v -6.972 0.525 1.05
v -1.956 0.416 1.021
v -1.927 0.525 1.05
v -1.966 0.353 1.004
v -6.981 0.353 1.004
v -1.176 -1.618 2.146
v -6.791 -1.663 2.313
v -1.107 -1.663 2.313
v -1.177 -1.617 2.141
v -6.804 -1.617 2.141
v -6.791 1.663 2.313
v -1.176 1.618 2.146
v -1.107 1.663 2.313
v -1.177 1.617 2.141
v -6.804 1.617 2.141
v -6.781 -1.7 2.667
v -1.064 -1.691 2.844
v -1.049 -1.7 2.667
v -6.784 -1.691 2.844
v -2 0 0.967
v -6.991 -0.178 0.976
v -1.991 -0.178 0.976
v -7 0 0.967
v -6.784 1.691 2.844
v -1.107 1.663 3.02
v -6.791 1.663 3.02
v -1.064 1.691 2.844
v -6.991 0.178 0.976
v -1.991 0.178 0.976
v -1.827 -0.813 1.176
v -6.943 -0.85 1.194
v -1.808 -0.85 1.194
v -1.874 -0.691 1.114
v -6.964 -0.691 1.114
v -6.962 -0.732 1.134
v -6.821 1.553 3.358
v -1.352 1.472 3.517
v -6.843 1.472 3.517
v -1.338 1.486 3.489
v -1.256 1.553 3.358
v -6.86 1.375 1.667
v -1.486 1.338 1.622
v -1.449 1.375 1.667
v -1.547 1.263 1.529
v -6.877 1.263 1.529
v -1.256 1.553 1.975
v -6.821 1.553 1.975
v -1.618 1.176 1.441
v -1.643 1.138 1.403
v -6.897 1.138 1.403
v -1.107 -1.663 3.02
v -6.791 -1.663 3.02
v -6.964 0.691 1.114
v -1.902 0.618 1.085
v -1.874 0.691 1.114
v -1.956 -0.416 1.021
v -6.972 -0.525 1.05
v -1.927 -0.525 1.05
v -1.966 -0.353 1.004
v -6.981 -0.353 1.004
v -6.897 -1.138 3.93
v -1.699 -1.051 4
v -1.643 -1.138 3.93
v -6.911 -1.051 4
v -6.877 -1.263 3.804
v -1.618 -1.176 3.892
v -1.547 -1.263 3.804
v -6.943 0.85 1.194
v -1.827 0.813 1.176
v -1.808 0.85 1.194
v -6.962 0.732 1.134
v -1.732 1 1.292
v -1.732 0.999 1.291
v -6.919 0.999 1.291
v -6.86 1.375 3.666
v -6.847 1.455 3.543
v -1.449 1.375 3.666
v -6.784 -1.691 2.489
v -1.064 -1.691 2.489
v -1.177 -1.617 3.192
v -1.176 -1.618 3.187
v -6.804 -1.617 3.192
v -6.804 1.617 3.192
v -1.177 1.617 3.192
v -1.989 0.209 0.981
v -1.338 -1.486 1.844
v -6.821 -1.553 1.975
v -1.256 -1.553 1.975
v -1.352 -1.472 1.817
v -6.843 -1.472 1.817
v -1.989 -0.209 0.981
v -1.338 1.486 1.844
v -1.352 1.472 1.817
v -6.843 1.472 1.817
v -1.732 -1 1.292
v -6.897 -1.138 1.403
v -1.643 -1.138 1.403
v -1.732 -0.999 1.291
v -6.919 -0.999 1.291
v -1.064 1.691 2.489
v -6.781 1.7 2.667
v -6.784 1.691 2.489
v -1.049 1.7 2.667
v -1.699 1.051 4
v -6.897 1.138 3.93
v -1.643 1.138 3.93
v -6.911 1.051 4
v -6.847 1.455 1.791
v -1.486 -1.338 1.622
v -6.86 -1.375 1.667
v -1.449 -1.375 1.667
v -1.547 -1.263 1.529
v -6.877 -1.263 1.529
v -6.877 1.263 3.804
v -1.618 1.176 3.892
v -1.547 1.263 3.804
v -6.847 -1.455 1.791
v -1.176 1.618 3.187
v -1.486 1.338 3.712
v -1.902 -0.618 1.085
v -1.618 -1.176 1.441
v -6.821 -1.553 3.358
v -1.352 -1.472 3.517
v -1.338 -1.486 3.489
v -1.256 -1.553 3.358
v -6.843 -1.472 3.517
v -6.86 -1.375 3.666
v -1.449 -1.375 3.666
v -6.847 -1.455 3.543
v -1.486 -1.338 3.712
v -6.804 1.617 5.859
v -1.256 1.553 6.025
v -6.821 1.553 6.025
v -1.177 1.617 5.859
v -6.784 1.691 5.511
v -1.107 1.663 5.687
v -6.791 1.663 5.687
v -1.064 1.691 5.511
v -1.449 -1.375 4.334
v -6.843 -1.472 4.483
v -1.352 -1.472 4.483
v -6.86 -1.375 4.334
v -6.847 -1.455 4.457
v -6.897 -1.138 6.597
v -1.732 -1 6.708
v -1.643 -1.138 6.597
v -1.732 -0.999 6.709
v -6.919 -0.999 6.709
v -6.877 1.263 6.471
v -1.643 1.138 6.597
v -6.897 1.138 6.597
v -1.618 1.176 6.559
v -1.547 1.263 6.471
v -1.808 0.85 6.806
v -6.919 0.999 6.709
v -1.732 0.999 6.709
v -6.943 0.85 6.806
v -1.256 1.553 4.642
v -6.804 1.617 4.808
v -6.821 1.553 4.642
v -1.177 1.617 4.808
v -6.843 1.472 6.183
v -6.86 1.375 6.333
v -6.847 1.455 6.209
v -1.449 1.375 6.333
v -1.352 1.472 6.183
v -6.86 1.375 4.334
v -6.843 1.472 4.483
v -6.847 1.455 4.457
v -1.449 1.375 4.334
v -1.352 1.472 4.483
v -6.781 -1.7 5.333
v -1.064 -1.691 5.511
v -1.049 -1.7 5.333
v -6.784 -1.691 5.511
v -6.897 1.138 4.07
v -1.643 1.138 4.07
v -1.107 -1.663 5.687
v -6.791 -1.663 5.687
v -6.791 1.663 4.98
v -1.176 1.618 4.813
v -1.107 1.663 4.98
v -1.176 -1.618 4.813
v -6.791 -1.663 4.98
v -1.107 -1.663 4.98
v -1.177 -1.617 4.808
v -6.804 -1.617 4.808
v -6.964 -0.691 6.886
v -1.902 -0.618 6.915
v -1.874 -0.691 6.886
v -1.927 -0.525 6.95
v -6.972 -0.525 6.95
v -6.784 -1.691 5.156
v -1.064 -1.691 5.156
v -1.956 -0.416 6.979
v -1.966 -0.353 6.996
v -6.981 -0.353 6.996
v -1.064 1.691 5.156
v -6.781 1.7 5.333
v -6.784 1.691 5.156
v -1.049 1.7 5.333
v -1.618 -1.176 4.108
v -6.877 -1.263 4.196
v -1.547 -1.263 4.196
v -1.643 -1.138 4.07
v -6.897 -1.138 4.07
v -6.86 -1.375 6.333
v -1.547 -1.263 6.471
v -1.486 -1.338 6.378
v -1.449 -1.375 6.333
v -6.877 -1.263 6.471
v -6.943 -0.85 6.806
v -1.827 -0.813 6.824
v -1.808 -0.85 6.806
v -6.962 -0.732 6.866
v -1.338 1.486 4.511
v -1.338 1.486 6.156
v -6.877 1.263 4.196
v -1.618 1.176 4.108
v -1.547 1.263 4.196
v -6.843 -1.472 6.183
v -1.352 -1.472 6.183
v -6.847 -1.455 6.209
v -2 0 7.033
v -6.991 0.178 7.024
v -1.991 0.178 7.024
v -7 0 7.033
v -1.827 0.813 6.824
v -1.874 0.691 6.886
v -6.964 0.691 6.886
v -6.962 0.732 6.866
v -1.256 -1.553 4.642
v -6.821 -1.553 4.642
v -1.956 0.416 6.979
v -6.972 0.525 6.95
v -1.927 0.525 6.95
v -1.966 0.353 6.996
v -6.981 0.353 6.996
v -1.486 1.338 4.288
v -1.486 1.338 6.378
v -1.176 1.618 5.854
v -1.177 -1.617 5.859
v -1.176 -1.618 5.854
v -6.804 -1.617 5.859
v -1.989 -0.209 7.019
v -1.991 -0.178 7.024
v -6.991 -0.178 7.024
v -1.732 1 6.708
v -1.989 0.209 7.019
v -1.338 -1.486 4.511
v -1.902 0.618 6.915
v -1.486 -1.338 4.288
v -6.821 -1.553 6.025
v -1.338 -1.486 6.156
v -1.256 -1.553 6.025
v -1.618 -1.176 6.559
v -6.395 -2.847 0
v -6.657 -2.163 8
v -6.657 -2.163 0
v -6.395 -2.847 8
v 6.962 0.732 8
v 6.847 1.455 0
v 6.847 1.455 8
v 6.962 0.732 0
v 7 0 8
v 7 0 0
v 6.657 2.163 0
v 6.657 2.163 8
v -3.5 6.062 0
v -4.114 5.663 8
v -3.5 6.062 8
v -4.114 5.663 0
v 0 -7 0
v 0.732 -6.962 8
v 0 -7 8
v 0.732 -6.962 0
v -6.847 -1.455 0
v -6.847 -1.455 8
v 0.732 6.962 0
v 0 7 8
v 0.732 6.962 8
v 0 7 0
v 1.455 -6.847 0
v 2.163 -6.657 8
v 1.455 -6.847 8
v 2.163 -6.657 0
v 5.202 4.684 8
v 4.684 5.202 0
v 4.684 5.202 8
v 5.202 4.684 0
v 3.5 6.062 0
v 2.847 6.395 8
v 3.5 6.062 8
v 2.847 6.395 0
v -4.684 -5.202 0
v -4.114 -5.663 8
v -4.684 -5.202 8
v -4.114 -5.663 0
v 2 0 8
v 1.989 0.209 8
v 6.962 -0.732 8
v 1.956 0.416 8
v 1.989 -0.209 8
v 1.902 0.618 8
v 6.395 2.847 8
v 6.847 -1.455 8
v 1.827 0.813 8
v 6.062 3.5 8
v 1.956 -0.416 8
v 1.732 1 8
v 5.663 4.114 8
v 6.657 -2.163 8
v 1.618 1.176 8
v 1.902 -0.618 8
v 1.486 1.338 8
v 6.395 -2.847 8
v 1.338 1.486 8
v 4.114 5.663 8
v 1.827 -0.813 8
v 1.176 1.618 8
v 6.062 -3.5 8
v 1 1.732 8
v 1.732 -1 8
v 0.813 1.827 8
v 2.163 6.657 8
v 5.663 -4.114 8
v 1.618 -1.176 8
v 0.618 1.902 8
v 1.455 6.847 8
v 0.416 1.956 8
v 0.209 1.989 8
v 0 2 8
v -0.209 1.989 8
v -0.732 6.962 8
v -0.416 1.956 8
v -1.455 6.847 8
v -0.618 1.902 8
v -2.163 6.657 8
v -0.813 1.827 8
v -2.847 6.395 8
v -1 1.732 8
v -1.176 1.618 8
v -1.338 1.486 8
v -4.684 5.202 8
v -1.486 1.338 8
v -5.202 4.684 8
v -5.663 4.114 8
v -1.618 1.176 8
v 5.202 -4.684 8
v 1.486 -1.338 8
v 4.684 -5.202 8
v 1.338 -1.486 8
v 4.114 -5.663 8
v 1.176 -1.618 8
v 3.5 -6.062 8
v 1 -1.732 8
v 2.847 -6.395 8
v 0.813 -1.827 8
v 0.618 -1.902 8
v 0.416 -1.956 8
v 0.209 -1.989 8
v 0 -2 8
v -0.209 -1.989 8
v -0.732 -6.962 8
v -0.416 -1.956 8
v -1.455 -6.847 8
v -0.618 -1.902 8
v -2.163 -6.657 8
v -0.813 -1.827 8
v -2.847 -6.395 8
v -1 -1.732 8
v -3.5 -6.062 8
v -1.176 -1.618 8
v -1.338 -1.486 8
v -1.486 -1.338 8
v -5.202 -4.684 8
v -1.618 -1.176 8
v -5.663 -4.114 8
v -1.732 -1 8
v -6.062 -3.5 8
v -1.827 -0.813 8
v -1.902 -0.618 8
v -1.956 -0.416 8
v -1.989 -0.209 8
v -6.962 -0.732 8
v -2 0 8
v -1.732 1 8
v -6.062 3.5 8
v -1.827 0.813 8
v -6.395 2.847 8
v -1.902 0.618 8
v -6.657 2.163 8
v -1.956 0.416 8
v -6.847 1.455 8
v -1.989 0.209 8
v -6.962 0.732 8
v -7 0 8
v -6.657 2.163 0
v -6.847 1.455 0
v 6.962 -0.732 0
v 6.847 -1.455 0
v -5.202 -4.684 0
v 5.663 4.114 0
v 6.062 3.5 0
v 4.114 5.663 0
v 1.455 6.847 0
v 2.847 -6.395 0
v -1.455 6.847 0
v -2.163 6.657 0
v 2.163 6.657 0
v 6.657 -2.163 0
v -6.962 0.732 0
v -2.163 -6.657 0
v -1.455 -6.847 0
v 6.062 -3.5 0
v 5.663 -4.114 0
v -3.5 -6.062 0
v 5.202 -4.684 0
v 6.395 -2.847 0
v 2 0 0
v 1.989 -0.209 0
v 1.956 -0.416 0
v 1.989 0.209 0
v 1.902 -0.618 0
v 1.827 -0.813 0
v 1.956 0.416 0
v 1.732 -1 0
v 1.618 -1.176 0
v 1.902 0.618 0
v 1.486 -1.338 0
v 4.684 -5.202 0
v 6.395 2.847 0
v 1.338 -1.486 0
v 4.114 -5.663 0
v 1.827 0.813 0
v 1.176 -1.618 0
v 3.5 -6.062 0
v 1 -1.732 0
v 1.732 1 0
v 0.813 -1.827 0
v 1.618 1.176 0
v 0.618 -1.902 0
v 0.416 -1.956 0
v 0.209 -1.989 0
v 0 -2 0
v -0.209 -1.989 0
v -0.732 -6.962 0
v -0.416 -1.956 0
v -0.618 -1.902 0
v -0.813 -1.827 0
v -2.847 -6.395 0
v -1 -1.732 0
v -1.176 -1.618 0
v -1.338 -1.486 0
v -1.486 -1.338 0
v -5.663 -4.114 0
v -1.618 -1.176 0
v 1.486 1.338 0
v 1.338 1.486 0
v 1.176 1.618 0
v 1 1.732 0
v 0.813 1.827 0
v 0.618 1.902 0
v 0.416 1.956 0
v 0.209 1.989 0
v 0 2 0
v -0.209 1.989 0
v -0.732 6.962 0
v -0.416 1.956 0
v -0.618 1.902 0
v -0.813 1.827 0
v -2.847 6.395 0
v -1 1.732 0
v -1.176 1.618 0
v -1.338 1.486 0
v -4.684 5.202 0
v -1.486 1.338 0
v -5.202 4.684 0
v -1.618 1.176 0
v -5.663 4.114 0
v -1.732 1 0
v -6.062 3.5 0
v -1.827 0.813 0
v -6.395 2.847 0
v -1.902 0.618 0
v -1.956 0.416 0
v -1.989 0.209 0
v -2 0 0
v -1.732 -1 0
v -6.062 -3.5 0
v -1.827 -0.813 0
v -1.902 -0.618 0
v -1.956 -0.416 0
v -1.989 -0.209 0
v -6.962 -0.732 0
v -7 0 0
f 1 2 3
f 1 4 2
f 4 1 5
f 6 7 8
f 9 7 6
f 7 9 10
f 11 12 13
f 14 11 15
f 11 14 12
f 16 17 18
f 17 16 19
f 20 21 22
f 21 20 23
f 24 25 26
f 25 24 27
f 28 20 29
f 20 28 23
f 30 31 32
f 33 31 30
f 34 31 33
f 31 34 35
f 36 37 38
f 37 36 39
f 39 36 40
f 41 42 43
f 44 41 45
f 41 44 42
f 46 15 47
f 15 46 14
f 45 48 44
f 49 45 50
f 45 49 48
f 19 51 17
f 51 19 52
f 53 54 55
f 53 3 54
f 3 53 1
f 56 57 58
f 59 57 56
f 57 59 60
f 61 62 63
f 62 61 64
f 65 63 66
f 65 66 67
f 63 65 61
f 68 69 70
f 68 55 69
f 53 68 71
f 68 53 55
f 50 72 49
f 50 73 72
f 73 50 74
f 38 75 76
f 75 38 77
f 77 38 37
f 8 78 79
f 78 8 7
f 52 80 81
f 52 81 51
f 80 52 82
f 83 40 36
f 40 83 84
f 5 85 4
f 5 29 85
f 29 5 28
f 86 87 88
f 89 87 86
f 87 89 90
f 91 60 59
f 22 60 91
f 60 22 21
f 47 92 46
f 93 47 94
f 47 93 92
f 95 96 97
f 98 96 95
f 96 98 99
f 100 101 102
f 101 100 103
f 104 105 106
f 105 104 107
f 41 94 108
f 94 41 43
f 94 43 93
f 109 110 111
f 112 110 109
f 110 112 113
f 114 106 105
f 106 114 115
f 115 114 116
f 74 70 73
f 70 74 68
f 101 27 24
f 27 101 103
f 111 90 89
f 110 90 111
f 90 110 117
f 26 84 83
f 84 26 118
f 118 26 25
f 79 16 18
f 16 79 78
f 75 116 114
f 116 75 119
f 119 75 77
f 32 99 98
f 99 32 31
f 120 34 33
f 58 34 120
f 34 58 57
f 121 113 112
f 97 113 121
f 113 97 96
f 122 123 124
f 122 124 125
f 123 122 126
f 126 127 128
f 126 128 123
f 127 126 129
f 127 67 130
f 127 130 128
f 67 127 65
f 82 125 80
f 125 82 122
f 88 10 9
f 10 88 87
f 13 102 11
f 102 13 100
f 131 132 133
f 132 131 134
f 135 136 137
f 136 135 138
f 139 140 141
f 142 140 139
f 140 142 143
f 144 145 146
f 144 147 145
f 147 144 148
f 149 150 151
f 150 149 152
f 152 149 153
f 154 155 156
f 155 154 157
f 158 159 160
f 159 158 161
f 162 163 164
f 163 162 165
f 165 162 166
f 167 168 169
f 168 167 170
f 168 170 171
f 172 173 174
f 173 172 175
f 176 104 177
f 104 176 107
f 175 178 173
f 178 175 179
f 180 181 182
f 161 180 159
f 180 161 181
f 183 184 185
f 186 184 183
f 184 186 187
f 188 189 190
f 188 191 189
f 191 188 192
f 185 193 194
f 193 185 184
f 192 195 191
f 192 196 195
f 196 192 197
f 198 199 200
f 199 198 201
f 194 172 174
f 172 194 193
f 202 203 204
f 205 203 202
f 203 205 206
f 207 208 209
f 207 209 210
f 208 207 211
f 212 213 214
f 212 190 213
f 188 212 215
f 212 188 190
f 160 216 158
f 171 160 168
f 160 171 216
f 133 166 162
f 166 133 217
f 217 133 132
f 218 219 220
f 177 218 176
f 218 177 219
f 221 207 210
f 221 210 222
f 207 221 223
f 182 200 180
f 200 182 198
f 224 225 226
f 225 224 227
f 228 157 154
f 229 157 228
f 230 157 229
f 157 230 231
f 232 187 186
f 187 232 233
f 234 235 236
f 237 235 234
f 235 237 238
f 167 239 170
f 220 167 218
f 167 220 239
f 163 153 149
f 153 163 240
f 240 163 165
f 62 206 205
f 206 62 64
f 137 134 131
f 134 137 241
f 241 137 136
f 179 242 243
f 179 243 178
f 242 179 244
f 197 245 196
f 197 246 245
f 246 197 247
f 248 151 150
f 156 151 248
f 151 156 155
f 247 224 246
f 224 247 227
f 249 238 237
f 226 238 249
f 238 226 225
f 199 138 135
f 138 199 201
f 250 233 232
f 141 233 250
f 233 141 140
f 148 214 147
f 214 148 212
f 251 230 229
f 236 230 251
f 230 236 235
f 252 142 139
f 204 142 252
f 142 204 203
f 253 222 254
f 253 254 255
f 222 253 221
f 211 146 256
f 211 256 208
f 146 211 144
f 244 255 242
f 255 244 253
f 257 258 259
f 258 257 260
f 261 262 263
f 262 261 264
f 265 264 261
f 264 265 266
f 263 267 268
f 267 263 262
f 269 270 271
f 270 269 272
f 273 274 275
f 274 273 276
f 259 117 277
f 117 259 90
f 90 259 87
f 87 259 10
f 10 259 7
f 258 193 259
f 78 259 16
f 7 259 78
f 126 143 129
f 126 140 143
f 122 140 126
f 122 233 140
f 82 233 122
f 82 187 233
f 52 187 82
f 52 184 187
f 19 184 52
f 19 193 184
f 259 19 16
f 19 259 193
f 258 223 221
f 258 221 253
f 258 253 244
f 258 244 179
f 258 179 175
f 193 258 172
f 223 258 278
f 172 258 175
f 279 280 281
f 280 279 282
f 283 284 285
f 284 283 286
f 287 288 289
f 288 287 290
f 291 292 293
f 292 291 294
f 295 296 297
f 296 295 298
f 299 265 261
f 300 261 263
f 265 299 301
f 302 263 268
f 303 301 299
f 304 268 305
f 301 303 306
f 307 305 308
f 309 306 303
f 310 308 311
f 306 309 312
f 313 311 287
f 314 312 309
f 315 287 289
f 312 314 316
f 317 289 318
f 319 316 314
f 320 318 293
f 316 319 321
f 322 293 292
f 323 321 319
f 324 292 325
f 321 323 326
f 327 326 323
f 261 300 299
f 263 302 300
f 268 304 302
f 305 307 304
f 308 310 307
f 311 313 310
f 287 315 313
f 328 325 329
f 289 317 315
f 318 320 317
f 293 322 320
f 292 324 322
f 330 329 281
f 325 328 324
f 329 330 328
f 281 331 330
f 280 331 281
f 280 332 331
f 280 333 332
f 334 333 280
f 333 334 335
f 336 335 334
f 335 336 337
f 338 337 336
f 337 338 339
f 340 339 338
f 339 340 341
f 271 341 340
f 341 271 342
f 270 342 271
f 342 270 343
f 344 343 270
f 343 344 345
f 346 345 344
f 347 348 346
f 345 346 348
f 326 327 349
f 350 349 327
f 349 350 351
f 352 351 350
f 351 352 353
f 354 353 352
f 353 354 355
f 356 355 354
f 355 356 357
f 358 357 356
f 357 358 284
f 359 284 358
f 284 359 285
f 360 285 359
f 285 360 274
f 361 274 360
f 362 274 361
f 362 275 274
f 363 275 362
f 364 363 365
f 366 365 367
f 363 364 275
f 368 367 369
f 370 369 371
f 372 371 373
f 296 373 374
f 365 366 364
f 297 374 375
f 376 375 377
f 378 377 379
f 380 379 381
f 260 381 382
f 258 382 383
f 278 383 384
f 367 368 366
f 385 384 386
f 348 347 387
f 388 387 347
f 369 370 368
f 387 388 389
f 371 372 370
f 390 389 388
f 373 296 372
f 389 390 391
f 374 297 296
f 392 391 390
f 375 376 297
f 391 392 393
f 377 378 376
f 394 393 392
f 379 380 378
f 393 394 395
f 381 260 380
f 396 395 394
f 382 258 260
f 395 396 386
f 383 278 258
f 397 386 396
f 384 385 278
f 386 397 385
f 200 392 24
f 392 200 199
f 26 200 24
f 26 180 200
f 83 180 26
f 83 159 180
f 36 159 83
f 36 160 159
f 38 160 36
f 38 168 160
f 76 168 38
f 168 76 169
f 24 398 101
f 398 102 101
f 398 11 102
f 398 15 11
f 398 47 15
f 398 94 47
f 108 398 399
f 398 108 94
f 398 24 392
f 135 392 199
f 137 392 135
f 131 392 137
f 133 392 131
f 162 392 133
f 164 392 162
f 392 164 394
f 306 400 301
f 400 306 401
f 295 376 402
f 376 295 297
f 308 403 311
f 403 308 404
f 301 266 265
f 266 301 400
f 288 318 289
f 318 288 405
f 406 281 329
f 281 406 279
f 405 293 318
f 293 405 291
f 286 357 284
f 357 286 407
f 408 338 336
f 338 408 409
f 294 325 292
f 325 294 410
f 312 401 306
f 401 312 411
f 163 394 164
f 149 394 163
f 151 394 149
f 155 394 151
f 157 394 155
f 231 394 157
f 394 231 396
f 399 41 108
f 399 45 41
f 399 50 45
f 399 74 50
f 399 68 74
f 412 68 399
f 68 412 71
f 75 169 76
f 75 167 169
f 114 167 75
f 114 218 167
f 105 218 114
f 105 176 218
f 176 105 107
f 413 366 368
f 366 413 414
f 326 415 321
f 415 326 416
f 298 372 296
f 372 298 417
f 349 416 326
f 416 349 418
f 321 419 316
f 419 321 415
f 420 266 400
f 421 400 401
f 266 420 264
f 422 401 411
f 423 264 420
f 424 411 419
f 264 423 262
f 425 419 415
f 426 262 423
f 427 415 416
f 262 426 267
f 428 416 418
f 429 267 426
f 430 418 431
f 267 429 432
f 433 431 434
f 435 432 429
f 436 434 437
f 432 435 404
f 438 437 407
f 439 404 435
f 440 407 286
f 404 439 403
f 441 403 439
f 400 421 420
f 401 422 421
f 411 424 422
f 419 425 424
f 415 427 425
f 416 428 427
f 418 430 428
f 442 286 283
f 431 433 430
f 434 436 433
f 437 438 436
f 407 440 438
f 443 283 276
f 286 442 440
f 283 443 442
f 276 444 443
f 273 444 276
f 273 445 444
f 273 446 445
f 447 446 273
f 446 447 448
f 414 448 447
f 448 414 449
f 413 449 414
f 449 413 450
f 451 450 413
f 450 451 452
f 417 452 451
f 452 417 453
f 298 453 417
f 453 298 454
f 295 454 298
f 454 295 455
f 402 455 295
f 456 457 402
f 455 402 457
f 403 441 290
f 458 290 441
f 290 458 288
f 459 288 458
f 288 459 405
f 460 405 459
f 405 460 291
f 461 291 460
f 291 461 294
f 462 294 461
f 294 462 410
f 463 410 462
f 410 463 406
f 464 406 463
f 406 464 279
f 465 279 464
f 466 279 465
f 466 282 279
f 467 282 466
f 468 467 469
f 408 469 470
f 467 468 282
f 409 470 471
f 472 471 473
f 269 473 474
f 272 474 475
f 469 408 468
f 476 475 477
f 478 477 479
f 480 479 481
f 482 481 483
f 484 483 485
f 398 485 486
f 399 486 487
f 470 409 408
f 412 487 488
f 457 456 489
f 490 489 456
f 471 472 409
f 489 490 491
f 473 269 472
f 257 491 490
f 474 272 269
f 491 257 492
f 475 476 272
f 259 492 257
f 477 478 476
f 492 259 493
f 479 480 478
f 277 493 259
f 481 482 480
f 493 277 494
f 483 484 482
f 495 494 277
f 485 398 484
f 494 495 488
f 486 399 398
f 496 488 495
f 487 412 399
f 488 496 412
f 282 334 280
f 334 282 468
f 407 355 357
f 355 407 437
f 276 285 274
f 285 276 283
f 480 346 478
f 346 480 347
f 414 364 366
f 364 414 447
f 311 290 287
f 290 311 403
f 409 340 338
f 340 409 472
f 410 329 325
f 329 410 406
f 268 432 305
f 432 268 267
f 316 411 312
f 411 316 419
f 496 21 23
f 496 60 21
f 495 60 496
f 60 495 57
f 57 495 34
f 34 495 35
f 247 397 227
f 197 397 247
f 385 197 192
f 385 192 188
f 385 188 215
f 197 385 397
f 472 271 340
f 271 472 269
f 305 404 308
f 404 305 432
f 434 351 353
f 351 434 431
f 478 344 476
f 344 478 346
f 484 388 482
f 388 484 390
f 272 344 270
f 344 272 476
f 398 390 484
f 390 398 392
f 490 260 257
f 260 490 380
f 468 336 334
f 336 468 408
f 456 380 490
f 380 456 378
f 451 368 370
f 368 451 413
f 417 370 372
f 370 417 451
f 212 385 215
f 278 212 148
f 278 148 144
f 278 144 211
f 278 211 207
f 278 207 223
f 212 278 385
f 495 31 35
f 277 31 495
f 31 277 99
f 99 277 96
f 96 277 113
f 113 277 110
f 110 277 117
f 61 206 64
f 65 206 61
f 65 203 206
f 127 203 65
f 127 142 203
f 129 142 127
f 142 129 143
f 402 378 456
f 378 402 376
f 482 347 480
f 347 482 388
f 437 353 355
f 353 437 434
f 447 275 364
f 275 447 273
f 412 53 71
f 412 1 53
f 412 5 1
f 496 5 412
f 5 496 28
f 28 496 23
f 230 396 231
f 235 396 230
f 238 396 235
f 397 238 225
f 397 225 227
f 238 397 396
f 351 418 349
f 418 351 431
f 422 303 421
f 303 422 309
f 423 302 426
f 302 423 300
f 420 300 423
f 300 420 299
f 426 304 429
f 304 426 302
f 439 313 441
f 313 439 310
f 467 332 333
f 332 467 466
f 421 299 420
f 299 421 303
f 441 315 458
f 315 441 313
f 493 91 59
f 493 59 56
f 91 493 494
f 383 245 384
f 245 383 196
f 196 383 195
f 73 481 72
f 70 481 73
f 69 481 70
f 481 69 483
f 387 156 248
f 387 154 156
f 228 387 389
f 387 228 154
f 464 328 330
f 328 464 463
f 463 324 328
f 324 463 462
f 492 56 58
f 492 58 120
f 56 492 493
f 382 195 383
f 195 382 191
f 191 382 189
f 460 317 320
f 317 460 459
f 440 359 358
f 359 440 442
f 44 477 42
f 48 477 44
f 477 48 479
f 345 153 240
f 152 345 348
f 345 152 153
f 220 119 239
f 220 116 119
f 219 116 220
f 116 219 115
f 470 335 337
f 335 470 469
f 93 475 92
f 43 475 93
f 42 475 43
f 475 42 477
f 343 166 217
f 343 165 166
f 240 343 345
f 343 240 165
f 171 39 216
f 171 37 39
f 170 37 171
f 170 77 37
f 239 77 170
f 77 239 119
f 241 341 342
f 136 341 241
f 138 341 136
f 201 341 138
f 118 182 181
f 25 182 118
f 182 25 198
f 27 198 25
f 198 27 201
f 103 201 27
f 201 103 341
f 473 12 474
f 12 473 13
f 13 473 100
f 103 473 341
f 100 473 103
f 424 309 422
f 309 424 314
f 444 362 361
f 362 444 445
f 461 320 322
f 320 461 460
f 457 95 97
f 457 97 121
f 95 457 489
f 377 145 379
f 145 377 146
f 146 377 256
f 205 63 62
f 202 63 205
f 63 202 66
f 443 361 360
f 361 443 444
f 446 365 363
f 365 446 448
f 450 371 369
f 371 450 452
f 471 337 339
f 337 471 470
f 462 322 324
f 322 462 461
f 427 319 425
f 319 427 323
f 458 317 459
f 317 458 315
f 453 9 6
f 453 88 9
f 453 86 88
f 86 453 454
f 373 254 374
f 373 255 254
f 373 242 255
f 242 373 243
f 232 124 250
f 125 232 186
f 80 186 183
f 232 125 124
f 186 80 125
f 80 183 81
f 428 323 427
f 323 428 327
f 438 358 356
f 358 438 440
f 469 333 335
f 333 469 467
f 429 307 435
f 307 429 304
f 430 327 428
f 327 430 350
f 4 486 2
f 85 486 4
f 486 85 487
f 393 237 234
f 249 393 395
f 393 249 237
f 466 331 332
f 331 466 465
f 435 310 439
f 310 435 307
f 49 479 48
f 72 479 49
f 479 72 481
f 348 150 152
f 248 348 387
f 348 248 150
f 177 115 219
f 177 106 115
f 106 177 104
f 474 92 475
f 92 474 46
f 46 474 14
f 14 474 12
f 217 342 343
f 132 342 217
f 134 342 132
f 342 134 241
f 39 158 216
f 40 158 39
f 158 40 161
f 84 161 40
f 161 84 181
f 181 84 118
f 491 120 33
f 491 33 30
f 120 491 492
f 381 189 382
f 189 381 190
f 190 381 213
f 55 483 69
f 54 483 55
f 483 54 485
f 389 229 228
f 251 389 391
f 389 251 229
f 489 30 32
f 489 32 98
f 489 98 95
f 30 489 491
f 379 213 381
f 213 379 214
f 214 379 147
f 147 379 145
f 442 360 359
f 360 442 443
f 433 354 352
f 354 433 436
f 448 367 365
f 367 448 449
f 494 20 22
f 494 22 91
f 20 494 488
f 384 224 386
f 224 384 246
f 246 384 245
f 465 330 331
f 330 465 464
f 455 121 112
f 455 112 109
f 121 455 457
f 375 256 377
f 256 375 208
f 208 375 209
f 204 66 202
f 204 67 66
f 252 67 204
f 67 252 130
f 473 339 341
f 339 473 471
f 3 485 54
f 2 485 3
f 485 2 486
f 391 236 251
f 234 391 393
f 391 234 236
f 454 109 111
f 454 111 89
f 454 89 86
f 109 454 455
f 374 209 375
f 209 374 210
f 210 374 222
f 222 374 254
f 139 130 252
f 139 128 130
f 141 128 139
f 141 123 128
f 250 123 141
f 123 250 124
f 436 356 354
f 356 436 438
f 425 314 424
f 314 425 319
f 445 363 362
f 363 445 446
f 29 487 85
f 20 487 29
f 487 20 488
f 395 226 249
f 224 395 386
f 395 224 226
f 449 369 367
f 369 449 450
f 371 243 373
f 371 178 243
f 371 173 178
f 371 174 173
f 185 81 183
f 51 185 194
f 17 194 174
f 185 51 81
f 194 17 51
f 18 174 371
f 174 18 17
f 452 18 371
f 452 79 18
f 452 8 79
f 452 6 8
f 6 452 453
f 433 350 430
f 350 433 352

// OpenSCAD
// Double-screw locking collar.
$fn = 60;
eps = 0.02;
shaft_d = 4;
outer_d = 14;
width = 8;
difference() {
    cylinder(d=outer_d,h=width);
    translate([0,0,-eps]) cylinder(d=shaft_d,h=width+2*eps);
    for (z=[width/3,2*width/3]) translate([-outer_d/2-eps,0,z]) rotate([0,90,0]) cylinder(d=3.4,h=outer_d/2+2*eps);
}
